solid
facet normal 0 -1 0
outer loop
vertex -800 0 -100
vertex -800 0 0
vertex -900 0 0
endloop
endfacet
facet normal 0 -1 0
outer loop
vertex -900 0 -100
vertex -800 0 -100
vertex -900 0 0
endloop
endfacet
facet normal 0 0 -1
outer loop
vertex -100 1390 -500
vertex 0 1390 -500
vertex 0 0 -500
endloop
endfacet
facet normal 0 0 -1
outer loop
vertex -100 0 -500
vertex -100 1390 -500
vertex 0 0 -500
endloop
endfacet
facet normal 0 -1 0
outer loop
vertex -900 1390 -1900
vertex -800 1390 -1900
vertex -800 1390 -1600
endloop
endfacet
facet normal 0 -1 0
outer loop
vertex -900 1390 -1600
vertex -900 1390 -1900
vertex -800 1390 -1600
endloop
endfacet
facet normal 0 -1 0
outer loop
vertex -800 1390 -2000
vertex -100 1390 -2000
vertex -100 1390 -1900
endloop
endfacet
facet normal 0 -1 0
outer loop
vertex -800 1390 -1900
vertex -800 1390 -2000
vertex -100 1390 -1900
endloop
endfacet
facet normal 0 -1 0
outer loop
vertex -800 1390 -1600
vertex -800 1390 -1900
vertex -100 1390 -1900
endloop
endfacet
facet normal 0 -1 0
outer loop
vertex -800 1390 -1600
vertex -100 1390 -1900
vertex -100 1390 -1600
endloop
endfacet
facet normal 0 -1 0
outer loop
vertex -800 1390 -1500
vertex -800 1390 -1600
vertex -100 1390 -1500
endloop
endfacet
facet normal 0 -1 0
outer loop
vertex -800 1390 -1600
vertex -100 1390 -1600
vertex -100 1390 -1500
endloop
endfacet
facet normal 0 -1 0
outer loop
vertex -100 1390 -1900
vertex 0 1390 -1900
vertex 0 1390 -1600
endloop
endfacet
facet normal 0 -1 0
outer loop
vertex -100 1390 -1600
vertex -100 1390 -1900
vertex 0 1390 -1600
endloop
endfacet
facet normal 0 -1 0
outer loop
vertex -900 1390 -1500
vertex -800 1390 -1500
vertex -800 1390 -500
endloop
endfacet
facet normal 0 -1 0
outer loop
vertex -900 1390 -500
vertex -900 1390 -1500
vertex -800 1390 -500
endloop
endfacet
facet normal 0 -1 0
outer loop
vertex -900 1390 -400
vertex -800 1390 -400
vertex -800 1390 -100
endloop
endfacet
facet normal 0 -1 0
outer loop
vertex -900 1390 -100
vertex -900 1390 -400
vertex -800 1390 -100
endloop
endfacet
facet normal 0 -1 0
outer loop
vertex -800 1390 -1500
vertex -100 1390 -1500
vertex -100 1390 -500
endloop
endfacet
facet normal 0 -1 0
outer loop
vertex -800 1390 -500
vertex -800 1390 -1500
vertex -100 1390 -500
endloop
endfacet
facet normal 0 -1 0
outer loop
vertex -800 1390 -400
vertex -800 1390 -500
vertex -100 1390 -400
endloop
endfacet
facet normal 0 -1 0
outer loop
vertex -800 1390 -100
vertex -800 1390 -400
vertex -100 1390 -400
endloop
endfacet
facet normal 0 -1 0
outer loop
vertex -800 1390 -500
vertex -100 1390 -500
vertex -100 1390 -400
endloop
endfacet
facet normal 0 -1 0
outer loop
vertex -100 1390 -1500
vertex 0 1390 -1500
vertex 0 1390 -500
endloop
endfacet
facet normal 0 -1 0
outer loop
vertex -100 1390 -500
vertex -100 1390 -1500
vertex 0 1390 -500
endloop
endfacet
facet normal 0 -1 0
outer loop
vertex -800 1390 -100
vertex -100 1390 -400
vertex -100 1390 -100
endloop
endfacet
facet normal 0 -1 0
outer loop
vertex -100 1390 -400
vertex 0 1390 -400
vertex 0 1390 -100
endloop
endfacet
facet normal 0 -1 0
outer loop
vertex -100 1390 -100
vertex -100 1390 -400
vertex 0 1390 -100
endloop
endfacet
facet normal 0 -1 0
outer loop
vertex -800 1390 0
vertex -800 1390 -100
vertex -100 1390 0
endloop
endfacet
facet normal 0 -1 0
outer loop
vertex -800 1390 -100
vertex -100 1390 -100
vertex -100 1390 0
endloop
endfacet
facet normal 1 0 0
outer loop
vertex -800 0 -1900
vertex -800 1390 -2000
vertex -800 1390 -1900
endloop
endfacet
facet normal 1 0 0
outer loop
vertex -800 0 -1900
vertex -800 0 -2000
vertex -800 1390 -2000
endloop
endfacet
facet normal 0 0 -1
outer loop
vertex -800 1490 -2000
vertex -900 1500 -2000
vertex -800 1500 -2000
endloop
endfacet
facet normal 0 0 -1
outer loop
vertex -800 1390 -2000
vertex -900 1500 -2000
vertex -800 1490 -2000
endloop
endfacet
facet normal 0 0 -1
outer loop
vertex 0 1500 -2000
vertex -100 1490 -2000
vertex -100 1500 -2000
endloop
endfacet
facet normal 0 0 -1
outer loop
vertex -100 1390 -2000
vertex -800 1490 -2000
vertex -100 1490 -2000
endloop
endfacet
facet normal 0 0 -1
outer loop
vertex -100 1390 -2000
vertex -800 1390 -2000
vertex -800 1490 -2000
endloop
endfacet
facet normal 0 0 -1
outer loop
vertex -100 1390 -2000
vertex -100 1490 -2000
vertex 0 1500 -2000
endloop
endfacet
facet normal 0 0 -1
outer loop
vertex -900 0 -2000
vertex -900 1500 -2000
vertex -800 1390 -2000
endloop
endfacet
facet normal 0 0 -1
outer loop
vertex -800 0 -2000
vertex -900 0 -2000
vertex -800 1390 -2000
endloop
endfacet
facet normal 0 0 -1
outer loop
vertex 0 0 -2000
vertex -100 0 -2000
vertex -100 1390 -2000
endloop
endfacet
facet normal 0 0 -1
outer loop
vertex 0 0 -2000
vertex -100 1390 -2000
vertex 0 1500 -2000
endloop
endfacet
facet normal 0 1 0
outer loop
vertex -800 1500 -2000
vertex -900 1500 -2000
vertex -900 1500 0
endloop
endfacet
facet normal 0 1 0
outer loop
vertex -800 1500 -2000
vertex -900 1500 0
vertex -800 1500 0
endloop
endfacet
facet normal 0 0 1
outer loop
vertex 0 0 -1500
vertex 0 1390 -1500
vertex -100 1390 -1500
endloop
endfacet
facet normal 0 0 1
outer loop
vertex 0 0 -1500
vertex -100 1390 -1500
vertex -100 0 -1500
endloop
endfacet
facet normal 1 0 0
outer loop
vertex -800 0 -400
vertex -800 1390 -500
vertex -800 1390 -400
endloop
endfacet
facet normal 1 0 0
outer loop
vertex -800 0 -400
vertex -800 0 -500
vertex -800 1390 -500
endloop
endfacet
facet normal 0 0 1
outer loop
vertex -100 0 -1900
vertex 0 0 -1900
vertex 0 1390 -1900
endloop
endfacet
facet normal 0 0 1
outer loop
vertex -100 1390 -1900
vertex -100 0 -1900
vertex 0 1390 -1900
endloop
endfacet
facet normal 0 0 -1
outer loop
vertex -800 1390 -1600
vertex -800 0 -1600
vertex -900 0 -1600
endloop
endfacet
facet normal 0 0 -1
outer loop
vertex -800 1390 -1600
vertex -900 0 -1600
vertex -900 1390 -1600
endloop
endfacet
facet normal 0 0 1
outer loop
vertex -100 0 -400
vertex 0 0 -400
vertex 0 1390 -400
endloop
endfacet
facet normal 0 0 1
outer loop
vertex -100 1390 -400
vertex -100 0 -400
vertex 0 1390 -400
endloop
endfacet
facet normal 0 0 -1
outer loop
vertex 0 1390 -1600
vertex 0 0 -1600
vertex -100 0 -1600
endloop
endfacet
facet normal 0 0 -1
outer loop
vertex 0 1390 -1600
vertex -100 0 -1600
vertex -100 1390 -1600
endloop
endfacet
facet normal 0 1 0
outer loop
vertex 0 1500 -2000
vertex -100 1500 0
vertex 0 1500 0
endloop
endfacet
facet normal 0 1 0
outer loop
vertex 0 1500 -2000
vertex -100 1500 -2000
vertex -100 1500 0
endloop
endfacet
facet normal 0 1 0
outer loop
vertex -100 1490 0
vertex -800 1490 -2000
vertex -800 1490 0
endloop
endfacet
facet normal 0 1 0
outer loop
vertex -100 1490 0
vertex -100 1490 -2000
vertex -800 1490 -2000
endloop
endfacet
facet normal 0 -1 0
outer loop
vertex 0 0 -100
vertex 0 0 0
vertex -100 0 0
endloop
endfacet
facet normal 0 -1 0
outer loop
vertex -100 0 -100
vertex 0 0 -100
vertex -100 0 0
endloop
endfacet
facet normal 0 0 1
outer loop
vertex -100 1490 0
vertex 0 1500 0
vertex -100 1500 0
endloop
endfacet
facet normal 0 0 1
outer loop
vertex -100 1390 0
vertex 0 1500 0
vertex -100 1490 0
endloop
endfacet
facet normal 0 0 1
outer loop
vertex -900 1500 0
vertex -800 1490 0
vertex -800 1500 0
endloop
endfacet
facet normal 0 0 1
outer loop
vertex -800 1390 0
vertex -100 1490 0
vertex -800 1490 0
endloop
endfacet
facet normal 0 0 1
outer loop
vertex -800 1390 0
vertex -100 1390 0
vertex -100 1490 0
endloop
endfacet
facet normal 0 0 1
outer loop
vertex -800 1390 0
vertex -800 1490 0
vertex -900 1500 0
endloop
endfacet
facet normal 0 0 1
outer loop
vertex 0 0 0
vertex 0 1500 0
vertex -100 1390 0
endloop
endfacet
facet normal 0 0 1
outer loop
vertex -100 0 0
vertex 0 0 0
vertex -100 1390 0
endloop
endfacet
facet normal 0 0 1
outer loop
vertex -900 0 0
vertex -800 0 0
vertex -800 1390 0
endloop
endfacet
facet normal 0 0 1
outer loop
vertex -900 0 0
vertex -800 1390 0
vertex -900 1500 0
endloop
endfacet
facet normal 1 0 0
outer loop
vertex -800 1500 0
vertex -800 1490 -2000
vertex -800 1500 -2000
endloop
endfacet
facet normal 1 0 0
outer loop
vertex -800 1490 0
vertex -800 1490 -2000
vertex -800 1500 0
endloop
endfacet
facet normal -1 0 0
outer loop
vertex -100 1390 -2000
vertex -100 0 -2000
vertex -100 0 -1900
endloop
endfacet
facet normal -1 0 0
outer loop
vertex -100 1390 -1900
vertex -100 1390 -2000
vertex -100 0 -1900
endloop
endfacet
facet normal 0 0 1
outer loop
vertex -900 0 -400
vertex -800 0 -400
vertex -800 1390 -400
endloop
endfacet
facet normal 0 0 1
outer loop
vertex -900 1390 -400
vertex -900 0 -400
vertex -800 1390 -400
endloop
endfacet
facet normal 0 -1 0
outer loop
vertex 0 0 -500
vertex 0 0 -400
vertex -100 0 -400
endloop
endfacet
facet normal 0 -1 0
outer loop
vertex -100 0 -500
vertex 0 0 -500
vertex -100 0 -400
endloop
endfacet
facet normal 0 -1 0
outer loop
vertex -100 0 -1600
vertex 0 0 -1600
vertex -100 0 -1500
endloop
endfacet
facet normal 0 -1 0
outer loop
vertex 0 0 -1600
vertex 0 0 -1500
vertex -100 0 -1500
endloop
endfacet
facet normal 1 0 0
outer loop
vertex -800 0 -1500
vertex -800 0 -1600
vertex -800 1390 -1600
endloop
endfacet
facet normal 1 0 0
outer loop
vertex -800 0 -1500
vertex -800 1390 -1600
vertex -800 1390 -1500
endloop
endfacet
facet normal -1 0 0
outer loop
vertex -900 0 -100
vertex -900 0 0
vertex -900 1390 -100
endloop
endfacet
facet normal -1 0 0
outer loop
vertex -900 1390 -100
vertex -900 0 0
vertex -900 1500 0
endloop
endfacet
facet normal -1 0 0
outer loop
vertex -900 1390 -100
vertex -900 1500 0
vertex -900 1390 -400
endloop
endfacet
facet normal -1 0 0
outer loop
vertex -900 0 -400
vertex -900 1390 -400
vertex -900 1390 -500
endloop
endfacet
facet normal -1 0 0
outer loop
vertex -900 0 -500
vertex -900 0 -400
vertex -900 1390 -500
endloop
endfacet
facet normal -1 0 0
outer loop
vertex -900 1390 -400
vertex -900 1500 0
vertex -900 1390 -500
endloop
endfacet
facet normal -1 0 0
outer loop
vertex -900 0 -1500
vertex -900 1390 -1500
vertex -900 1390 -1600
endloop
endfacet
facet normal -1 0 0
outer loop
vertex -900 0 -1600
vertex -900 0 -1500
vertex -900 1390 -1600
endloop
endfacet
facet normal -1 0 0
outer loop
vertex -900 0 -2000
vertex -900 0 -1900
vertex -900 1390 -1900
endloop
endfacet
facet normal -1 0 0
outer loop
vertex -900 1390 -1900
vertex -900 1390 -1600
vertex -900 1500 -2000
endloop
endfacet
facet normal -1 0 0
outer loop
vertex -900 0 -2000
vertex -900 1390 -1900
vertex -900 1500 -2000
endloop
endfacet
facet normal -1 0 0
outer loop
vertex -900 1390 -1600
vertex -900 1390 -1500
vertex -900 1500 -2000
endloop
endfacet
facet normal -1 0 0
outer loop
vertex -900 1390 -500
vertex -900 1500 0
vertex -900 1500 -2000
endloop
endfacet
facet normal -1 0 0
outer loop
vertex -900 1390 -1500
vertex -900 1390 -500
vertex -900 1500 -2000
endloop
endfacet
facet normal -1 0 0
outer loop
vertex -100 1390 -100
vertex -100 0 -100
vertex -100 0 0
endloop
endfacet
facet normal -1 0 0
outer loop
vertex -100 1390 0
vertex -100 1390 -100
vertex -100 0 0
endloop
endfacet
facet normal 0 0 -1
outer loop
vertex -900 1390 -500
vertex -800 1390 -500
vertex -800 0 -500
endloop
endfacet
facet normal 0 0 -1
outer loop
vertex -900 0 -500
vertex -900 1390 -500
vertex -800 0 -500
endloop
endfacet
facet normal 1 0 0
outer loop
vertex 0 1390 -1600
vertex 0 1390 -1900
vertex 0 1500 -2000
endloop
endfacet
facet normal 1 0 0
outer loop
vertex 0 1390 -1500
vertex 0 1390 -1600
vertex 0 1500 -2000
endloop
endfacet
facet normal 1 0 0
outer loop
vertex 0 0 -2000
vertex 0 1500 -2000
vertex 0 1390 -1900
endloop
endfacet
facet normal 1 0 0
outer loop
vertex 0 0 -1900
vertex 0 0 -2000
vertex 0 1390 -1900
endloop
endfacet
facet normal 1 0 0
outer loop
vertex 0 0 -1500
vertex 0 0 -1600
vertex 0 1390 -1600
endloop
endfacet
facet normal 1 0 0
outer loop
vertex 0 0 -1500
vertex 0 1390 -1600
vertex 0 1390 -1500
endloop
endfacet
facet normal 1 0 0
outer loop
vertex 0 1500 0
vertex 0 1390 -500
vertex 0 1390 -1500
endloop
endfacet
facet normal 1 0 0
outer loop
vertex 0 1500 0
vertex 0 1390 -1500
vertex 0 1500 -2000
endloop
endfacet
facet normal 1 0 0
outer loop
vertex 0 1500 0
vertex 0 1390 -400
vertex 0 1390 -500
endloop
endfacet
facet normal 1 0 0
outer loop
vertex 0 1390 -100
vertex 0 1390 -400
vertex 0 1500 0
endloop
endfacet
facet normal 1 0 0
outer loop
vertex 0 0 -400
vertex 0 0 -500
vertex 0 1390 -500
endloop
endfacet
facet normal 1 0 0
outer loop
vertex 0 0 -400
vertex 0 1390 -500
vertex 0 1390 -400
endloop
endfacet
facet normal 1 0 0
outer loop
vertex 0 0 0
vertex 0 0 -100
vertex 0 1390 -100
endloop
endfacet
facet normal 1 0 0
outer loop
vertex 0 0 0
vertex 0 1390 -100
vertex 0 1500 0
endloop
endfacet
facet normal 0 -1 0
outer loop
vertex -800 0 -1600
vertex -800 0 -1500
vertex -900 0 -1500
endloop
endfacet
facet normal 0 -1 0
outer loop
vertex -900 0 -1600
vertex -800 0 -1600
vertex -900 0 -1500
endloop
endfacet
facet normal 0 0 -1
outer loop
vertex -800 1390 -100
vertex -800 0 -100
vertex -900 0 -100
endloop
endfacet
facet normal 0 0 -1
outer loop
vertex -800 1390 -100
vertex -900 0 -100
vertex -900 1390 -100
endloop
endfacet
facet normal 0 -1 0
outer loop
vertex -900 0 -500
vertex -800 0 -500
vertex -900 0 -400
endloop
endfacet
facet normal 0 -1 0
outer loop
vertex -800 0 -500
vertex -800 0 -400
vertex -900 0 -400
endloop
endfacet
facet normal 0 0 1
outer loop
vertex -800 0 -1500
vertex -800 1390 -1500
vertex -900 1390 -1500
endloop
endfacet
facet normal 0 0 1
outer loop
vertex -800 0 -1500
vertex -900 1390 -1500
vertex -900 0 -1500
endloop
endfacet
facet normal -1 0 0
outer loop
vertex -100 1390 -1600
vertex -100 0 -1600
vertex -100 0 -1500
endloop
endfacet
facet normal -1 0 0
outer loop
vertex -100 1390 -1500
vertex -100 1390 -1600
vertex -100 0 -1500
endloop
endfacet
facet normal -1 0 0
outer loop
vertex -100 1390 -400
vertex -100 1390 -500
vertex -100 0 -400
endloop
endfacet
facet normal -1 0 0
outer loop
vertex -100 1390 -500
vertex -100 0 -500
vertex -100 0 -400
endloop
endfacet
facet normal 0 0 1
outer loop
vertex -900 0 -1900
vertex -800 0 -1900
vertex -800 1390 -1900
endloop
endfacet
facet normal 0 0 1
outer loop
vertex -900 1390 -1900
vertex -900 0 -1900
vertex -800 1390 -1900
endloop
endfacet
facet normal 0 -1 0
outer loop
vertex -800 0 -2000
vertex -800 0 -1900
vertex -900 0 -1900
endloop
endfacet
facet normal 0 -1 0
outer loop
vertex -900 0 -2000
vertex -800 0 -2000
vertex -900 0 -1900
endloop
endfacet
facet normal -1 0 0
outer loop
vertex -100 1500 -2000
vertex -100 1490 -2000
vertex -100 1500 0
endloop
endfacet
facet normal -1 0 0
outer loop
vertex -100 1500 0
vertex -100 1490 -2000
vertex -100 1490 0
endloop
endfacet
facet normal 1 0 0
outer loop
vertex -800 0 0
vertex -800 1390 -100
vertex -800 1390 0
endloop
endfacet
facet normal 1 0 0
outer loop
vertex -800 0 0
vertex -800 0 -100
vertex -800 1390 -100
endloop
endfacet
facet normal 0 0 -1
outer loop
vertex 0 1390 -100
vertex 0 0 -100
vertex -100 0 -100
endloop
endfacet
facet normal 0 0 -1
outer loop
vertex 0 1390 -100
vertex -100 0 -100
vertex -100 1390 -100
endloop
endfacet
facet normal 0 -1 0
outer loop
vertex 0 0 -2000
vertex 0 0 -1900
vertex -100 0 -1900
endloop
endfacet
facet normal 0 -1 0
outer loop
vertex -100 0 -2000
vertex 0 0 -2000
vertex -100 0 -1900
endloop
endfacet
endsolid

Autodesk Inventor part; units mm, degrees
ref_plane "YZ Plane" through (0, 0, 0) normal (1, 0, 0) x (0, 1, 0)
ref_plane "XZ Plane" through (0, 0, 0) normal (0, 1, 0) x (-1, 0, 0)
ref_plane "XY Plane" through (0, 0, 0) normal (0, 0, 1) x (1, 0, 0)
sketch "Sketch9" plane through (0, 0, 0) normal (0, 1, 0) x (-1, 0, 0)
  line L0 (0, 0) -> (900, 0)
  line L1 (900, 0) -> (900, -2000)
  line L2 (900, -2000) -> (0, -2000)
  line L3 (0, -2000) -> (0, 0)
  line L4 (900, -2000) -> (800, -2000)
  line L5 (800, -2000) -> (800, 3000)
  line L6 (800, 3000) -> (900, 3000)
  line L7 (900, 3000) -> (900, -2000)
  line L8 (0, -2000) -> (100, -2000)
  line L9 (100, -2000) -> (100, 0)
  line L10 (100, 0) -> (0, 0)
  line L11 (0, 0) -> (0, -2000)
  point P0 (100, -2000)
  point P1 (800, 0)
  dimension "d70" = 900
  dimension "d71" = 100
  dimension "d72" = 100
  dimension "d106" = 2000
extrude "Extrusion6" add sketch "Sketch9" along normal blind 1790 contours L0 L9 L2 L3 | L0 L1 L2 L5
sketch "Sketch10" plane through (0, 0, 0) normal (1, 0, 0) x (0, 0, -1)
  line L0 (0, 0) -> (0, 1790) projected
  line L1 (0, 1790) -> (5000, 1790)
  line L2 (5000, 1790) -> (5000, 1290)
  line L3 (5000, 1290) -> (0, 1290)
  line L4 (0, 1290) -> (0, 1790)
  line L5 (0, 1790) -> (5000, 1790)
  line L6 (5000, 1790) -> (5000, 1390)
  line L7 (5000, 1390) -> (0, 1390)
  line L8 (0, 1390) -> (0, 1790)
  line L9 (0, 1790) -> (5000, 1790)
  line L10 (5000, 1790) -> (5000, 1490)
  line L11 (5000, 1490) -> (0, 1490)
  line L12 (0, 1490) -> (0, 1790)
  line L13 (2000, 0) -> (0, 0) projected
  line L14 (0, 0) -> (500, 0)
  line L15 (500, 0) -> (500, 600)
  line L16 (500, 600) -> (0, 600)
  line L17 (0, 600) -> (0, 0)
  line L18 (2000, 0) -> (1500, 0)
  line L19 (1500, 0) -> (1500, 600)
  line L20 (1500, 600) -> (2000, 600)
  line L21 (2000, 600) -> (2000, 0)
  point P0 (5000, 1490)
  point P1 (0, 1490)
  point P2 (0, 1390)
  dimension "d83" = 500
  dimension "d84" = 500
  dimension "d85" = 600
  dimension "d86" = 600
extrude "Extrusion7" add sketch "Sketch10" against normal blind 900 contours L0 L11 L2 L7
sketch "Sketch13" plane through (0, 1790, 0) normal (0, 1, 0) x (1, 0, 0)
  line L0 (-900, 2000) -> (-900, 0) projected
  line L1 (0, 0) -> (0, 2000) projected
  line L2 (-900, 0) -> (0, 0)
  line L3 (0, 0) -> (0, 2000)
  line L4 (0, 2000) -> (-900, 2000)
  line L5 (-900, 2000) -> (-900, 0)
  point P0 (0, 4500)
extrude "Extrusion9" cut sketch "Sketch13" against normal blind 290
sketch "Boceto15" plane through (0, 1490, -2000) normal (0, 1, 0) x (1, 0, 0)
  line L0 (-900, 0) -> (-900, 3000) projected
  line L1 (0, 0) -> (-100, 0) projected
  line L2 (-900, 3000) -> (0, 3000)
  line L3 (0, 3000) -> (0, 0)
  line L4 (0, 0) -> (-900, 0)
  line L5 (-900, 0) -> (-900, 3000)
  point P0 (0, -2000)
  point P1 (-900, 0)
  point P2 (-100, 0)
extrude "Extrusión11" cut sketch "Boceto15" against normal blind 1500
sketch "Boceto16" plane through (0, 0, 0) normal (1, 0, 0) x (0, 0, -1)
  line L0 (0, 0) -> (500, 0)
  line L1 (2000, 0) -> (0, 0) projected
  line L2 (2000, 0) -> (1500, 0)
  line L3 (0, 1390) -> (2000, 1390) projected
  line L4 (500, 0) -> (400, 0)
  line L5 (400, 0) -> (400, 1390)
  line L6 (400, 1390) -> (500, 1390)
  line L7 (500, 1390) -> (500, 0)
  line L8 (0, 0) -> (100, 0)
  line L9 (100, 0) -> (100, 1390)
  line L10 (100, 1390) -> (0, 1390)
  line L11 (0, 1390) -> (0, 0)
  line L12 (2000, 0) -> (1900, 0)
  line L13 (1900, 0) -> (1900, 1390)
  line L14 (1900, 1390) -> (2000, 1390)
  line L15 (2000, 1390) -> (2000, 0)
  line L16 (1500, 0) -> (1600, 0)
  line L17 (1600, 0) -> (1600, 1390)
  line L18 (1600, 1390) -> (1500, 1390)
  line L19 (1500, 1390) -> (1500, 0)
  point P0 (1600, 1390)
  point P1 (1900, 1390)
  point P2 (1500, 1390)
  dimension "d110" = 500
  dimension "d111" = 500
  dimension "d112" = 100
  dimension "d113" = 100
  dimension "d114" = 100
  dimension "d115" = 100
extrude "Extrusión12" cut sketch "Boceto16" against normal blind 1500 contours L9 L3 L5 L0 | L7 L3 L19 L1 | L17 L3 L13 L1
properties part number "B_Transportadora_Recta_5m" material "Aluminum 6061"
